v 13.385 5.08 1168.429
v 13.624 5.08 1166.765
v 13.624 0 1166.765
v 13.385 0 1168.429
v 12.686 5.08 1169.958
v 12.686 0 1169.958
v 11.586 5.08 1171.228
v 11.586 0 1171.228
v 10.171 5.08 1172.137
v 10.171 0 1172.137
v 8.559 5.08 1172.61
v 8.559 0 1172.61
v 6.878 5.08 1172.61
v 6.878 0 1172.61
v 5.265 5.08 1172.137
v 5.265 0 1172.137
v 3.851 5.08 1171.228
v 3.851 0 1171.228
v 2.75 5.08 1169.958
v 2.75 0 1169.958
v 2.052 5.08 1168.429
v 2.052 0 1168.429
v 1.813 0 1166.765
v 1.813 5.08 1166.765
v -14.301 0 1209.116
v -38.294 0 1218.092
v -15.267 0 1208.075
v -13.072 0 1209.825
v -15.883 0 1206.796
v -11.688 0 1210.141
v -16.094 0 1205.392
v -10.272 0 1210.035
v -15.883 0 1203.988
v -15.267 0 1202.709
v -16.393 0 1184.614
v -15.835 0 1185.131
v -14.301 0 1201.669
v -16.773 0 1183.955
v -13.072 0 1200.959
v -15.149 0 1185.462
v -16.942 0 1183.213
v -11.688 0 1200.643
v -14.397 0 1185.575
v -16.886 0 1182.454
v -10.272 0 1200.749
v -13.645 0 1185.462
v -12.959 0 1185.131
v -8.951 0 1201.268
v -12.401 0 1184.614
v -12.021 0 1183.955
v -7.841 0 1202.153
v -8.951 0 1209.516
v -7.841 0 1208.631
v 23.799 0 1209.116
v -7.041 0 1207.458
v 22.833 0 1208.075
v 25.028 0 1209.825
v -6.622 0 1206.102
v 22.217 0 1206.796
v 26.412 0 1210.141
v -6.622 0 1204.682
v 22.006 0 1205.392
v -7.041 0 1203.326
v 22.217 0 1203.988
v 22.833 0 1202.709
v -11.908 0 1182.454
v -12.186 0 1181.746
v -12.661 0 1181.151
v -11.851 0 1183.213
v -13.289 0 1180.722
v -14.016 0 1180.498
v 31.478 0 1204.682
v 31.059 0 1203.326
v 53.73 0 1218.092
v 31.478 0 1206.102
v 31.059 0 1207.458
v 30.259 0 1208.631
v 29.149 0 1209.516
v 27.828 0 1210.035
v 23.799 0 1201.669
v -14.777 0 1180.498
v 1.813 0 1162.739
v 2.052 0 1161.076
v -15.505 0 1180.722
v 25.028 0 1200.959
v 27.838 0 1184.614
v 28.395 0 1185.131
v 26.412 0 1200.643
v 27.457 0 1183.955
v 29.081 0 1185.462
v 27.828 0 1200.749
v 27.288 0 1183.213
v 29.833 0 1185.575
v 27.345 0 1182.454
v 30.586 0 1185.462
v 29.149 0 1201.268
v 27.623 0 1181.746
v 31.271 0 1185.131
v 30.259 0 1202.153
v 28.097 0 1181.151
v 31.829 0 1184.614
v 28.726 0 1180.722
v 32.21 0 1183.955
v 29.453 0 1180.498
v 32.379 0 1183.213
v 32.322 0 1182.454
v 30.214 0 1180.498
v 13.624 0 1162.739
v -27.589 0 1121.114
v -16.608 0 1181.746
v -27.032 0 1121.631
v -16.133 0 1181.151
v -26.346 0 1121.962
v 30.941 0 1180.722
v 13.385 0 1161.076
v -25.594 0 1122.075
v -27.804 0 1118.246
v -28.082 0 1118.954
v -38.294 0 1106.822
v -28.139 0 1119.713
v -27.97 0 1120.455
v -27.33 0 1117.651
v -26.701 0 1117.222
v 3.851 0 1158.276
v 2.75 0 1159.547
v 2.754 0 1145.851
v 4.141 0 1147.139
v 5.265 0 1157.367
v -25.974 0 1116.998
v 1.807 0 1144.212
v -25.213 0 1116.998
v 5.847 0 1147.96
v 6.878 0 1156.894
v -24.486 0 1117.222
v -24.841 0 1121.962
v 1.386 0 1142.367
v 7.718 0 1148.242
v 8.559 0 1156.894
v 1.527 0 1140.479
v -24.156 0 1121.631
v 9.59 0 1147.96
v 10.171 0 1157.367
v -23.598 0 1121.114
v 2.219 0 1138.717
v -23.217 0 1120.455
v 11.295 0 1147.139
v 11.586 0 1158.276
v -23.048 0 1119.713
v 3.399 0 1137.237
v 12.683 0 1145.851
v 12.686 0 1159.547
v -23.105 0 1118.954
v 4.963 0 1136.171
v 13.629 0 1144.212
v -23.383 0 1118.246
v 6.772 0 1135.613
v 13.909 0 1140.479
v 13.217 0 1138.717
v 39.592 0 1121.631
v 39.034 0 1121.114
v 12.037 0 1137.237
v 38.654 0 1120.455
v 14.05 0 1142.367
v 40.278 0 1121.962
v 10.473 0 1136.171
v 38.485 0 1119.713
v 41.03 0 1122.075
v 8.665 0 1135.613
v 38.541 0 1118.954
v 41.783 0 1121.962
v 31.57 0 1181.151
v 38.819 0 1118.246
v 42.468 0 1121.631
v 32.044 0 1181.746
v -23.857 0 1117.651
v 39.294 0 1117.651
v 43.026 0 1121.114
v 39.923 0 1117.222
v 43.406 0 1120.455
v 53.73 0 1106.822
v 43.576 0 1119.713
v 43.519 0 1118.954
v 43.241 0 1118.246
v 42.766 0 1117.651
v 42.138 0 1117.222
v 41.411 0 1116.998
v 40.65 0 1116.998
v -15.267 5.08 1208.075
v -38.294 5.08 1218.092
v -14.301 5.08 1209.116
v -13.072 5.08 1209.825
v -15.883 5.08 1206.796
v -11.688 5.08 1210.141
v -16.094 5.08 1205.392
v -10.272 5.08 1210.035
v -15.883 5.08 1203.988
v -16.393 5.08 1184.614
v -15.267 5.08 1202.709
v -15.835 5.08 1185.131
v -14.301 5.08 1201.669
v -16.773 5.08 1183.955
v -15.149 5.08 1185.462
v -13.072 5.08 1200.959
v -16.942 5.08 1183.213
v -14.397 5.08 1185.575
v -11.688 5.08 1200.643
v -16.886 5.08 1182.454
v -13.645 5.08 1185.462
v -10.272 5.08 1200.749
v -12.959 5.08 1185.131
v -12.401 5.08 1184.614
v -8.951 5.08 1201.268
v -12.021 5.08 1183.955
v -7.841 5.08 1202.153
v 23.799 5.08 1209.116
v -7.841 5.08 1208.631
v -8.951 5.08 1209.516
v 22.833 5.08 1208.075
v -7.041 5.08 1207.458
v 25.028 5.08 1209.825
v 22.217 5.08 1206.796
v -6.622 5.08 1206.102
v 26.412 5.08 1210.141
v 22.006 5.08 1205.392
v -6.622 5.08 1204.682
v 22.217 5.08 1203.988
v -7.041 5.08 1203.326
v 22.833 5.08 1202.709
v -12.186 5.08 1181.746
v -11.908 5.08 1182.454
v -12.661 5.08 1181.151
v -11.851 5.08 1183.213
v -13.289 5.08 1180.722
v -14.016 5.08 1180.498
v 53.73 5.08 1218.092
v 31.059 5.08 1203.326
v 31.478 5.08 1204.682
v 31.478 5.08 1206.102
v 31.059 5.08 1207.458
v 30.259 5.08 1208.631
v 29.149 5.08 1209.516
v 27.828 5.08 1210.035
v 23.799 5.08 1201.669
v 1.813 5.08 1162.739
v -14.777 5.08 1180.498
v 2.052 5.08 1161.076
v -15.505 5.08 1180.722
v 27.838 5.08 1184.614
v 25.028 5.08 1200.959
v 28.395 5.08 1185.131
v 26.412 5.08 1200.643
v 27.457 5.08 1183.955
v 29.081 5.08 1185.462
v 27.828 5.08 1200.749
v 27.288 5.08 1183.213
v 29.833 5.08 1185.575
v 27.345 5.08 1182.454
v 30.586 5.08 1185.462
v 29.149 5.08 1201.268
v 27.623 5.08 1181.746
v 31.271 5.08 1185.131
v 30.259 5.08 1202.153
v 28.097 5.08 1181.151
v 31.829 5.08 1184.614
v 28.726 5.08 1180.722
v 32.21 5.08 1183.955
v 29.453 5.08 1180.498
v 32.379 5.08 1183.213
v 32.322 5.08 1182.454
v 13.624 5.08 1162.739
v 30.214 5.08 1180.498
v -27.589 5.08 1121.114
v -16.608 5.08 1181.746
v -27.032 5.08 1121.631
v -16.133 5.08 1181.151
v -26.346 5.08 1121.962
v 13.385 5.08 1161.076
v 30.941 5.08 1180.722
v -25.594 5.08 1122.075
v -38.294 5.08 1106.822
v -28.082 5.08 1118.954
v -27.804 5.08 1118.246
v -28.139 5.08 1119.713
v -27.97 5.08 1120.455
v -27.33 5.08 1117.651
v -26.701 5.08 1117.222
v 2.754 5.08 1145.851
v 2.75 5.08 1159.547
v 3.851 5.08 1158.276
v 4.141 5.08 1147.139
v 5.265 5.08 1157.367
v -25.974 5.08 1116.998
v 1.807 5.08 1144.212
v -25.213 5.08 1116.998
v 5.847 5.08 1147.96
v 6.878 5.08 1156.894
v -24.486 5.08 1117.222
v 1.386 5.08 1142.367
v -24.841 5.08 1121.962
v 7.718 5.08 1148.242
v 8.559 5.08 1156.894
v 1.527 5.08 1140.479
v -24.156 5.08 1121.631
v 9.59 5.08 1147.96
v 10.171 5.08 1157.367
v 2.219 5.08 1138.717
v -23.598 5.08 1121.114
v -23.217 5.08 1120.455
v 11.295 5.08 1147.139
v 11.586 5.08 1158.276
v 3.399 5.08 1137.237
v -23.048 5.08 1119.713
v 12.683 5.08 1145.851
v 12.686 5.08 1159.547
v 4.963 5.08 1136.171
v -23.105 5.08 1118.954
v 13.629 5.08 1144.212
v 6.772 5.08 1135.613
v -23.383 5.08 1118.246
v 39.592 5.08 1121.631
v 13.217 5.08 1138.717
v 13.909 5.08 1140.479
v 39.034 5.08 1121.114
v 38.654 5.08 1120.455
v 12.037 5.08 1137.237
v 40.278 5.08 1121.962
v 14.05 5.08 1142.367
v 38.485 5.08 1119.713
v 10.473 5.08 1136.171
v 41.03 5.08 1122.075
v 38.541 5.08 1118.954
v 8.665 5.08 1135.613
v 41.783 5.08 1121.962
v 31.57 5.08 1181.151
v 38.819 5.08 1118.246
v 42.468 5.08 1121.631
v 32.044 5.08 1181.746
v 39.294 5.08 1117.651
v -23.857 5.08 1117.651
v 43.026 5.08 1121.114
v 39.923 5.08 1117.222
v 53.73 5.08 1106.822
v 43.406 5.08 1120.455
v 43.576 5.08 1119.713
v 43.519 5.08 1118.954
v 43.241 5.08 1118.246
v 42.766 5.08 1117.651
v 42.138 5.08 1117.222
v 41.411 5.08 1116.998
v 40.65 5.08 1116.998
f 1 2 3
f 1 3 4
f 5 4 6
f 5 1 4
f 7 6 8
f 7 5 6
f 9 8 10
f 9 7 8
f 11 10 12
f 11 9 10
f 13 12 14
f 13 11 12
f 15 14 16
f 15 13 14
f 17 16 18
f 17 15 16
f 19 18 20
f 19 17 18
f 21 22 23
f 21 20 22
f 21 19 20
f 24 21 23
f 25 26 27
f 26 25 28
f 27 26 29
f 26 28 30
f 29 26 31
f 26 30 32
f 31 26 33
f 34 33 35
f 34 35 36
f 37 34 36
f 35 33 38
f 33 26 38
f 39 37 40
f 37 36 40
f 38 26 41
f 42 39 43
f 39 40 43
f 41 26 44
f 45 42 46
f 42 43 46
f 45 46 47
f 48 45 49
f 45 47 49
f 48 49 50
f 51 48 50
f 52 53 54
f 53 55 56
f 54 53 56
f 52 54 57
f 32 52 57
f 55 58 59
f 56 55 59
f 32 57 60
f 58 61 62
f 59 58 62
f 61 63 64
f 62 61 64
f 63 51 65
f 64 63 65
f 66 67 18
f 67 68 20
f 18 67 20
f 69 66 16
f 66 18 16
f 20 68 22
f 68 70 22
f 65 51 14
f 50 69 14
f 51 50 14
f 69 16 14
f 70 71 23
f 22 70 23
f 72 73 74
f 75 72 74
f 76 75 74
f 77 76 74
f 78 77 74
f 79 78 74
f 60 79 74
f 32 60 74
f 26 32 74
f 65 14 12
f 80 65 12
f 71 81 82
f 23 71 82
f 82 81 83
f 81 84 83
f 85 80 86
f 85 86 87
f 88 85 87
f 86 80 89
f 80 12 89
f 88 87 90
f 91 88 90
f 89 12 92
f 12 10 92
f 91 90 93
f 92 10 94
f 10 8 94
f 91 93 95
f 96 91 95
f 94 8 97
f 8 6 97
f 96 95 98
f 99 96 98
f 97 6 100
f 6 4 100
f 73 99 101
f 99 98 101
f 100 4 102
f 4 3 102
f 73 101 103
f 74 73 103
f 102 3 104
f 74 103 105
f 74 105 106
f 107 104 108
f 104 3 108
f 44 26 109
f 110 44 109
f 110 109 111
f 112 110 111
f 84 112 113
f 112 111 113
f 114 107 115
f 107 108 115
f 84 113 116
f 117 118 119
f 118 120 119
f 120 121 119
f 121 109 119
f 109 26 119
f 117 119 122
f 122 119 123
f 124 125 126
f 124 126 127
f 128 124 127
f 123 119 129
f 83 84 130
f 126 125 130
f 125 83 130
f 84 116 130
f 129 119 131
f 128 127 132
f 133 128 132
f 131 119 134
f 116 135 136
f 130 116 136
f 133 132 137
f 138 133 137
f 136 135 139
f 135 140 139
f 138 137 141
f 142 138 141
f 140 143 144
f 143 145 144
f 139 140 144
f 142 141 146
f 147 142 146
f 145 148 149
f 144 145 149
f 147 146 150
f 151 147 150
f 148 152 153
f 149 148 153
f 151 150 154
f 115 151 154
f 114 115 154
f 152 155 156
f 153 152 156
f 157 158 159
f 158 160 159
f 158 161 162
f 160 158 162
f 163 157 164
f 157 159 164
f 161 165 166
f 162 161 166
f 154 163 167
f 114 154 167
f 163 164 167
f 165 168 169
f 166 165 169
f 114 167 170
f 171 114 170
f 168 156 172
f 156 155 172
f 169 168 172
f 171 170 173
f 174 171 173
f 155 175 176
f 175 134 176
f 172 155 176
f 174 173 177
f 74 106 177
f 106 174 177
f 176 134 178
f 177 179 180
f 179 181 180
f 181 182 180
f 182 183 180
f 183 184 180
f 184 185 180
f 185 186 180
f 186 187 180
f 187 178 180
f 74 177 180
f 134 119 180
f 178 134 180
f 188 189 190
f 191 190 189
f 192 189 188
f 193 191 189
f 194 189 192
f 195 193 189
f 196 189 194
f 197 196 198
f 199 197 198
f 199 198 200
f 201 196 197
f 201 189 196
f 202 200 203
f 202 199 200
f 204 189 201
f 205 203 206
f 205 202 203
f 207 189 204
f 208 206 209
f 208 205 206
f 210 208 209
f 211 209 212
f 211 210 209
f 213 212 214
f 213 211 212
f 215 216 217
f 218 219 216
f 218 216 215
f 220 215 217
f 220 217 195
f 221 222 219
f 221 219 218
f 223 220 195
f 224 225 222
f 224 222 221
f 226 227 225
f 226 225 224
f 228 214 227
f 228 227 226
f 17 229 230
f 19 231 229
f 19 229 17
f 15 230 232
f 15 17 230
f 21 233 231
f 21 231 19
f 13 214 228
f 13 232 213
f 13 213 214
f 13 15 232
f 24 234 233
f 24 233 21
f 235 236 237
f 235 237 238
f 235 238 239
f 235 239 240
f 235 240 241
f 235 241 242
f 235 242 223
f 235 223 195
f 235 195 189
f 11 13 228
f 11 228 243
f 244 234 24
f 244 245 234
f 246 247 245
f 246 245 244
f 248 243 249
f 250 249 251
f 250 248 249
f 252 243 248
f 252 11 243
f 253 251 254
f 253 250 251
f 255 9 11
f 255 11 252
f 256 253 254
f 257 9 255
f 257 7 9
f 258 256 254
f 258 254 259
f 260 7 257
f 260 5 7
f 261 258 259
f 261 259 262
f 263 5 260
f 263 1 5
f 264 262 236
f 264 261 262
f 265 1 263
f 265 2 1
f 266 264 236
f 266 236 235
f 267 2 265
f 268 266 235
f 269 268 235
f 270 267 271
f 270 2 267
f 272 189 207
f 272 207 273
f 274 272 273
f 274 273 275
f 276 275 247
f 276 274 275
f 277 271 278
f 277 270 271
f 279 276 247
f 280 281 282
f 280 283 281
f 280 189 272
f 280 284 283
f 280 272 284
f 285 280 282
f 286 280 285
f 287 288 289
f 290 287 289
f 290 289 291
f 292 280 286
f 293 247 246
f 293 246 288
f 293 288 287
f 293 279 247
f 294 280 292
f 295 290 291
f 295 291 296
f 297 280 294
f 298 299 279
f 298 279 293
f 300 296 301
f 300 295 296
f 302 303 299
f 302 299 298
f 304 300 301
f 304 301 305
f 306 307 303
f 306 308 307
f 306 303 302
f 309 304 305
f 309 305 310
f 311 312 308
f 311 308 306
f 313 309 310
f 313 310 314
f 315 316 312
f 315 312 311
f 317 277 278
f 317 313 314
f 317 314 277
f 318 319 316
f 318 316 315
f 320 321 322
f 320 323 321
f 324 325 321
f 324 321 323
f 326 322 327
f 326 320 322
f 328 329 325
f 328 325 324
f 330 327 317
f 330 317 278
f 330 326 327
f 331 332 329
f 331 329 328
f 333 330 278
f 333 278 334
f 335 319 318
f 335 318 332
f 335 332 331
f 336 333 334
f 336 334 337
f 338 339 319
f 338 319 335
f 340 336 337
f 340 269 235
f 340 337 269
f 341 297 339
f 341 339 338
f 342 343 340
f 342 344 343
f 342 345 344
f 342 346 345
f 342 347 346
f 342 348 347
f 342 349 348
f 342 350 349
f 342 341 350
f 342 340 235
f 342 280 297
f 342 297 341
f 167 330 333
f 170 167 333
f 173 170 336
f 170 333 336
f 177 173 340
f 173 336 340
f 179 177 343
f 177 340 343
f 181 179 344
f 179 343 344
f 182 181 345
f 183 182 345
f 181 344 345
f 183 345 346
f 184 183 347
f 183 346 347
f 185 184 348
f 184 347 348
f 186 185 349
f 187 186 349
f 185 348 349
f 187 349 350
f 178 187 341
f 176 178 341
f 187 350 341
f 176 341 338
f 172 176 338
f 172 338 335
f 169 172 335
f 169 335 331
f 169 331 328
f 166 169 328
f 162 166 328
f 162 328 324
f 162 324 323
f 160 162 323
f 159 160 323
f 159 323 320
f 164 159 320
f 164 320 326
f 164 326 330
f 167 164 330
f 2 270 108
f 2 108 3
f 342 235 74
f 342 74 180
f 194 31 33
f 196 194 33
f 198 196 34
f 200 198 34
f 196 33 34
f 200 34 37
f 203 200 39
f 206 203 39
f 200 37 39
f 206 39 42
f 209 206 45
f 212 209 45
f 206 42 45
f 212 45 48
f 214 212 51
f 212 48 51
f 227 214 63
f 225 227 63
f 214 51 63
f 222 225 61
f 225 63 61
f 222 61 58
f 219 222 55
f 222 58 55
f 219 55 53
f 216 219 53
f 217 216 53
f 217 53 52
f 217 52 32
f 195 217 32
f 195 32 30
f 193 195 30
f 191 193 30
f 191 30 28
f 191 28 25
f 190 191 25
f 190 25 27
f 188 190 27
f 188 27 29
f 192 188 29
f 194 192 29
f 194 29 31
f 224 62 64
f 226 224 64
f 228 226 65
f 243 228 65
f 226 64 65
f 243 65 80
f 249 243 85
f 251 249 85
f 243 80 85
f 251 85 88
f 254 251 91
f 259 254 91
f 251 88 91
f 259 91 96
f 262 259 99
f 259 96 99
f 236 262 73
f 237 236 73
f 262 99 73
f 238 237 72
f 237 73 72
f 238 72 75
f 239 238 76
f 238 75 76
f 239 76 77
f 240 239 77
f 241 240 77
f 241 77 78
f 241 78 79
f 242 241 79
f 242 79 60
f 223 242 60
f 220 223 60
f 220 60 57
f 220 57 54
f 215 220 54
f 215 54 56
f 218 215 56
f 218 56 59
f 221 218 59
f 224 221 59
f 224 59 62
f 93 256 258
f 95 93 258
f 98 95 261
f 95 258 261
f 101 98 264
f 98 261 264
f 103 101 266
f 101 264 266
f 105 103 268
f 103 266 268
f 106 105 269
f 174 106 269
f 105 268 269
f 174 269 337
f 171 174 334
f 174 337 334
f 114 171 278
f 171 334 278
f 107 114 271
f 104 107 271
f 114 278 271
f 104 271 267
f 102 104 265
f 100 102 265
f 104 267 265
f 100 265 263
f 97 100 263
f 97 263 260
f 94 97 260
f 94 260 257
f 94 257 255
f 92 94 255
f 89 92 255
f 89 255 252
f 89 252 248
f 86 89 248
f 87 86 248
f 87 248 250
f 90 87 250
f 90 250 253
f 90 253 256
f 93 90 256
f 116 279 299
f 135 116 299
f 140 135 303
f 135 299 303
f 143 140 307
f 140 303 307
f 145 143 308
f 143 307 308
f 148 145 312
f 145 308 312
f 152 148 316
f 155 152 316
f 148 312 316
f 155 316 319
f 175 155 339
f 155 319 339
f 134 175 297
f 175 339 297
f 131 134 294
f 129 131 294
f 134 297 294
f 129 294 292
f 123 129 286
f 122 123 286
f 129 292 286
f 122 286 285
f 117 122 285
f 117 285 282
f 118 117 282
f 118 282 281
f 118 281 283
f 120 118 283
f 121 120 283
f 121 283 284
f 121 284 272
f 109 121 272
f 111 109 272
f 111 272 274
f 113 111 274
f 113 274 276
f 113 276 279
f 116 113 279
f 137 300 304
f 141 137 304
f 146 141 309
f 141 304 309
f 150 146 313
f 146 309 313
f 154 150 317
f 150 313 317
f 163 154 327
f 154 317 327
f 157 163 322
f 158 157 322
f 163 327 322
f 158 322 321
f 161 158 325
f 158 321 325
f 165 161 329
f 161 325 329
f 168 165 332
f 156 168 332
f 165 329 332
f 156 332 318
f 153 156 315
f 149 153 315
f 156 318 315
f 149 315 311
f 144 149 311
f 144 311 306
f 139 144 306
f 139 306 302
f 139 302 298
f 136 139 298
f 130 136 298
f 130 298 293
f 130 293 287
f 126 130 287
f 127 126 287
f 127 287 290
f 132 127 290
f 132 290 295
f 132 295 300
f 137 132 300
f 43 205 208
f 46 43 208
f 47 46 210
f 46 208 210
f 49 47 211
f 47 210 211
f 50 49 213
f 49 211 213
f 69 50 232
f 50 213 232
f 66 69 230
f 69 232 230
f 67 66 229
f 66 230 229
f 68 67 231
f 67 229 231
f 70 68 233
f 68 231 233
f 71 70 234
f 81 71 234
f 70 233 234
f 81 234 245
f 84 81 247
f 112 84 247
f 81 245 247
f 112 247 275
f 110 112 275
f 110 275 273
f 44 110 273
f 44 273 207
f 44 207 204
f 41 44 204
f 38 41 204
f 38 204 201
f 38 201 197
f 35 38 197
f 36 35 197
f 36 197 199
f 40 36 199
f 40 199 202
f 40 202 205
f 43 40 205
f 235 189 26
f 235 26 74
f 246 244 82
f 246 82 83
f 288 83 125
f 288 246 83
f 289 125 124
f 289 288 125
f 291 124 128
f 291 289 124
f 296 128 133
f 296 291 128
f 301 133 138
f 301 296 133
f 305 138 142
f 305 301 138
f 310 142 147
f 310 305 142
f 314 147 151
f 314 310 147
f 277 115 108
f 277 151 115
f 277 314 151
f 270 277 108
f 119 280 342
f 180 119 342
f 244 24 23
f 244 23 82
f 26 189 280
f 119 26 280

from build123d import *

# Parameters (mm, degrees)
BOSS_EXTRUDE1_DEPTH          = 5.08
F_3_8_0_375_DIAMETER_HOLE1_D = 9.525
F_3_8_0_375_DIAMETER_HOLE2_D = 9.525
SKETCH8_R                    = 6.35
CUT_EXTRUDE1_DEPTH           = 1371.578062618
SKETCH9_R                    = 2.5527
CUT_EXTRUDE2_DEPTH           = 1371.578062618
SKETCH10_OUTSIDE_W           = 496.242
SKETCH10_OUTSIDE_H           = 717.956
SKETCH10_OUTSIDE_W_2         = 92.023830603
SKETCH10_OUTSIDE_H_2         = 111.269815094
CUT_EXTRUDE3_DEPTH           = 1371.578062618


with BuildPart() as part:
    # Sketch1 → Boss-Extrude1 (new body)
    with BuildSketch(Plane(origin=(0, 0, 0), x_dir=(1, 0, 0), z_dir=(0, 1, 0))):
        with BuildLine():
            Line((186.706216966, -778.102360844), (-171.269771153, -778.102360844))
            add(Edge.make_bspline(
                [(-171.269771153, -778.102360844), (-159.707774454, -836.134775395), (-146.81892484, -893.9188082), (-132.611103769, -951.360767835), (-118.403260068, -1008.802818957), (-102.873342202, -1065.933903144), (-86.045569786, -1122.663773012), (-74.990089761, -1159.934062127), (-63.371281317, -1197.041907081), (-51.194215445, -1233.960969312), (-45.100567198, -1252.436009294), (-38.866841431, -1270.865430421), (-32.494599583, -1289.246240662), (-26.120797202, -1307.631552278), (-20.652525047, -1326.386680917), (-12.917829919, -1344.242199148)],
                knots=[0, 0, 0, 0, 0.177518923, 0.177518923, 0.177518923, 0.355038121, 0.355038121, 0.355038121, 0.471646972, 0.471646972, 0.471646972, 0.529995372, 0.529995372, 0.529995372, 0.588358391, 0.588358391, 0.588358391, 0.588358391], degree=3))
            ThreePointArc((-12.917829919, -1344.242199148), (7.718222897, -1357.79203399), (28.354275723, -1344.242199164))
            add(Edge.make_bspline(
                [(28.354275723, -1344.242199164), (38.120725658, -1321.696381858), (44.939237661, -1298.079369173), (60.823654171, -1251.671639351), (68.544496879, -1228.393431097), (91.029194373, -1158.368706478), (105.122355407, -1111.420274649), (144.723795491, -969.782644477), (167.537266257, -874.315888923), (186.706216966, -778.102360844)],
                knots=[0, 0, 0, 0, 0.125, 0.125, 0.25, 0.25, 0.5, 0.5, 1, 1, 1, 1], degree=3))
        make_face()
    extrude(amount=BOSS_EXTRUDE1_DEPTH)

    # 3/8 (0.375) Diameter Hole1 (through all)
    with Locations(Plane(origin=(0, 5.08, 0), x_dir=(1, 0, 0), z_dir=(0, 1, 0))):
        with Locations((7.718222897, -1326.04203399), (7.718222897, -1300.64203399)):
            Hole(F_3_8_0_375_DIAMETER_HOLE1_D / 2)

    # 3/8 (0.375) Diameter Hole2 (through all)
    with Locations(Plane(origin=(0, 5.08, 0), x_dir=(1, 0, 0), z_dir=(0, 1, 0))):
        with Locations((-49.431777094, -970.44203399), (-49.431777094, -1008.54203399), (64.868222906, -970.44203399), (64.868222906, -1008.54203399), (-11.331777094, -1205.39203399), (26.768222906, -1205.39203399)):
            Hole(F_3_8_0_375_DIAMETER_HOLE2_D / 2)

    # Sketch8 → Cut-Extrude1 (cut, through all)
    with BuildSketch(Plane(origin=(0, 5.08, 0), x_dir=(1, 0, 0), z_dir=(0, 1, 0))):
        with Locations((7.718222906, -1141.89203399)):
            Circle(SKETCH8_R)
        with BuildLine():
            Line((1.812722906, -1166.764753462), (1.812722906, -1162.739314519))
            ThreePointArc((1.812722906, -1162.739314519), (7.718222906, -1156.833814519), (13.623722906, -1162.739314519))
            Line((13.623722906, -1162.739314519), (13.623722906, -1166.764753462))
            ThreePointArc((13.623722906, -1166.764753462), (7.718222906, -1172.670253462), (1.812722906, -1166.764753462))
        make_face()
    extrude(amount=-CUT_EXTRUDE1_DEPTH, mode=Mode.SUBTRACT)

    # Sketch9 → Cut-Extrude2 (cut, through all)
    with BuildSketch(Plane(origin=(0, 5.08, 0), x_dir=(1, 0, 0), z_dir=(0, 1, 0))):
        with Locations((-14.396929121, -1183.022218896)):
            Circle(SKETCH9_R)
        with Locations((29.833374932, -1183.022218896)):
            Circle(SKETCH9_R)
        with Locations((41.030138207, -1119.522218896)):
            Circle(SKETCH9_R)
        with Locations((-25.593692396, -1119.522218896)):
            Circle(SKETCH9_R)
    extrude(amount=-CUT_EXTRUDE2_DEPTH, mode=Mode.SUBTRACT)

    # Sketch10 outside → Cut-Extrude3 (cut, through all)
    with BuildSketch(Plane(origin=(0, 5.08, 0), x_dir=(1, 0, 0), z_dir=(0, 1, 0))):
        with Locations((7.718, -1067.947)):
            Rectangle(SKETCH10_OUTSIDE_W, SKETCH10_OUTSIDE_H)
        with Locations((7.718222905, -1162.457126443)):
            Rectangle(SKETCH10_OUTSIDE_W_2, SKETCH10_OUTSIDE_H_2, mode=Mode.SUBTRACT)
    extrude(amount=-CUT_EXTRUDE3_DEPTH, mode=Mode.SUBTRACT)


solid = part.part
